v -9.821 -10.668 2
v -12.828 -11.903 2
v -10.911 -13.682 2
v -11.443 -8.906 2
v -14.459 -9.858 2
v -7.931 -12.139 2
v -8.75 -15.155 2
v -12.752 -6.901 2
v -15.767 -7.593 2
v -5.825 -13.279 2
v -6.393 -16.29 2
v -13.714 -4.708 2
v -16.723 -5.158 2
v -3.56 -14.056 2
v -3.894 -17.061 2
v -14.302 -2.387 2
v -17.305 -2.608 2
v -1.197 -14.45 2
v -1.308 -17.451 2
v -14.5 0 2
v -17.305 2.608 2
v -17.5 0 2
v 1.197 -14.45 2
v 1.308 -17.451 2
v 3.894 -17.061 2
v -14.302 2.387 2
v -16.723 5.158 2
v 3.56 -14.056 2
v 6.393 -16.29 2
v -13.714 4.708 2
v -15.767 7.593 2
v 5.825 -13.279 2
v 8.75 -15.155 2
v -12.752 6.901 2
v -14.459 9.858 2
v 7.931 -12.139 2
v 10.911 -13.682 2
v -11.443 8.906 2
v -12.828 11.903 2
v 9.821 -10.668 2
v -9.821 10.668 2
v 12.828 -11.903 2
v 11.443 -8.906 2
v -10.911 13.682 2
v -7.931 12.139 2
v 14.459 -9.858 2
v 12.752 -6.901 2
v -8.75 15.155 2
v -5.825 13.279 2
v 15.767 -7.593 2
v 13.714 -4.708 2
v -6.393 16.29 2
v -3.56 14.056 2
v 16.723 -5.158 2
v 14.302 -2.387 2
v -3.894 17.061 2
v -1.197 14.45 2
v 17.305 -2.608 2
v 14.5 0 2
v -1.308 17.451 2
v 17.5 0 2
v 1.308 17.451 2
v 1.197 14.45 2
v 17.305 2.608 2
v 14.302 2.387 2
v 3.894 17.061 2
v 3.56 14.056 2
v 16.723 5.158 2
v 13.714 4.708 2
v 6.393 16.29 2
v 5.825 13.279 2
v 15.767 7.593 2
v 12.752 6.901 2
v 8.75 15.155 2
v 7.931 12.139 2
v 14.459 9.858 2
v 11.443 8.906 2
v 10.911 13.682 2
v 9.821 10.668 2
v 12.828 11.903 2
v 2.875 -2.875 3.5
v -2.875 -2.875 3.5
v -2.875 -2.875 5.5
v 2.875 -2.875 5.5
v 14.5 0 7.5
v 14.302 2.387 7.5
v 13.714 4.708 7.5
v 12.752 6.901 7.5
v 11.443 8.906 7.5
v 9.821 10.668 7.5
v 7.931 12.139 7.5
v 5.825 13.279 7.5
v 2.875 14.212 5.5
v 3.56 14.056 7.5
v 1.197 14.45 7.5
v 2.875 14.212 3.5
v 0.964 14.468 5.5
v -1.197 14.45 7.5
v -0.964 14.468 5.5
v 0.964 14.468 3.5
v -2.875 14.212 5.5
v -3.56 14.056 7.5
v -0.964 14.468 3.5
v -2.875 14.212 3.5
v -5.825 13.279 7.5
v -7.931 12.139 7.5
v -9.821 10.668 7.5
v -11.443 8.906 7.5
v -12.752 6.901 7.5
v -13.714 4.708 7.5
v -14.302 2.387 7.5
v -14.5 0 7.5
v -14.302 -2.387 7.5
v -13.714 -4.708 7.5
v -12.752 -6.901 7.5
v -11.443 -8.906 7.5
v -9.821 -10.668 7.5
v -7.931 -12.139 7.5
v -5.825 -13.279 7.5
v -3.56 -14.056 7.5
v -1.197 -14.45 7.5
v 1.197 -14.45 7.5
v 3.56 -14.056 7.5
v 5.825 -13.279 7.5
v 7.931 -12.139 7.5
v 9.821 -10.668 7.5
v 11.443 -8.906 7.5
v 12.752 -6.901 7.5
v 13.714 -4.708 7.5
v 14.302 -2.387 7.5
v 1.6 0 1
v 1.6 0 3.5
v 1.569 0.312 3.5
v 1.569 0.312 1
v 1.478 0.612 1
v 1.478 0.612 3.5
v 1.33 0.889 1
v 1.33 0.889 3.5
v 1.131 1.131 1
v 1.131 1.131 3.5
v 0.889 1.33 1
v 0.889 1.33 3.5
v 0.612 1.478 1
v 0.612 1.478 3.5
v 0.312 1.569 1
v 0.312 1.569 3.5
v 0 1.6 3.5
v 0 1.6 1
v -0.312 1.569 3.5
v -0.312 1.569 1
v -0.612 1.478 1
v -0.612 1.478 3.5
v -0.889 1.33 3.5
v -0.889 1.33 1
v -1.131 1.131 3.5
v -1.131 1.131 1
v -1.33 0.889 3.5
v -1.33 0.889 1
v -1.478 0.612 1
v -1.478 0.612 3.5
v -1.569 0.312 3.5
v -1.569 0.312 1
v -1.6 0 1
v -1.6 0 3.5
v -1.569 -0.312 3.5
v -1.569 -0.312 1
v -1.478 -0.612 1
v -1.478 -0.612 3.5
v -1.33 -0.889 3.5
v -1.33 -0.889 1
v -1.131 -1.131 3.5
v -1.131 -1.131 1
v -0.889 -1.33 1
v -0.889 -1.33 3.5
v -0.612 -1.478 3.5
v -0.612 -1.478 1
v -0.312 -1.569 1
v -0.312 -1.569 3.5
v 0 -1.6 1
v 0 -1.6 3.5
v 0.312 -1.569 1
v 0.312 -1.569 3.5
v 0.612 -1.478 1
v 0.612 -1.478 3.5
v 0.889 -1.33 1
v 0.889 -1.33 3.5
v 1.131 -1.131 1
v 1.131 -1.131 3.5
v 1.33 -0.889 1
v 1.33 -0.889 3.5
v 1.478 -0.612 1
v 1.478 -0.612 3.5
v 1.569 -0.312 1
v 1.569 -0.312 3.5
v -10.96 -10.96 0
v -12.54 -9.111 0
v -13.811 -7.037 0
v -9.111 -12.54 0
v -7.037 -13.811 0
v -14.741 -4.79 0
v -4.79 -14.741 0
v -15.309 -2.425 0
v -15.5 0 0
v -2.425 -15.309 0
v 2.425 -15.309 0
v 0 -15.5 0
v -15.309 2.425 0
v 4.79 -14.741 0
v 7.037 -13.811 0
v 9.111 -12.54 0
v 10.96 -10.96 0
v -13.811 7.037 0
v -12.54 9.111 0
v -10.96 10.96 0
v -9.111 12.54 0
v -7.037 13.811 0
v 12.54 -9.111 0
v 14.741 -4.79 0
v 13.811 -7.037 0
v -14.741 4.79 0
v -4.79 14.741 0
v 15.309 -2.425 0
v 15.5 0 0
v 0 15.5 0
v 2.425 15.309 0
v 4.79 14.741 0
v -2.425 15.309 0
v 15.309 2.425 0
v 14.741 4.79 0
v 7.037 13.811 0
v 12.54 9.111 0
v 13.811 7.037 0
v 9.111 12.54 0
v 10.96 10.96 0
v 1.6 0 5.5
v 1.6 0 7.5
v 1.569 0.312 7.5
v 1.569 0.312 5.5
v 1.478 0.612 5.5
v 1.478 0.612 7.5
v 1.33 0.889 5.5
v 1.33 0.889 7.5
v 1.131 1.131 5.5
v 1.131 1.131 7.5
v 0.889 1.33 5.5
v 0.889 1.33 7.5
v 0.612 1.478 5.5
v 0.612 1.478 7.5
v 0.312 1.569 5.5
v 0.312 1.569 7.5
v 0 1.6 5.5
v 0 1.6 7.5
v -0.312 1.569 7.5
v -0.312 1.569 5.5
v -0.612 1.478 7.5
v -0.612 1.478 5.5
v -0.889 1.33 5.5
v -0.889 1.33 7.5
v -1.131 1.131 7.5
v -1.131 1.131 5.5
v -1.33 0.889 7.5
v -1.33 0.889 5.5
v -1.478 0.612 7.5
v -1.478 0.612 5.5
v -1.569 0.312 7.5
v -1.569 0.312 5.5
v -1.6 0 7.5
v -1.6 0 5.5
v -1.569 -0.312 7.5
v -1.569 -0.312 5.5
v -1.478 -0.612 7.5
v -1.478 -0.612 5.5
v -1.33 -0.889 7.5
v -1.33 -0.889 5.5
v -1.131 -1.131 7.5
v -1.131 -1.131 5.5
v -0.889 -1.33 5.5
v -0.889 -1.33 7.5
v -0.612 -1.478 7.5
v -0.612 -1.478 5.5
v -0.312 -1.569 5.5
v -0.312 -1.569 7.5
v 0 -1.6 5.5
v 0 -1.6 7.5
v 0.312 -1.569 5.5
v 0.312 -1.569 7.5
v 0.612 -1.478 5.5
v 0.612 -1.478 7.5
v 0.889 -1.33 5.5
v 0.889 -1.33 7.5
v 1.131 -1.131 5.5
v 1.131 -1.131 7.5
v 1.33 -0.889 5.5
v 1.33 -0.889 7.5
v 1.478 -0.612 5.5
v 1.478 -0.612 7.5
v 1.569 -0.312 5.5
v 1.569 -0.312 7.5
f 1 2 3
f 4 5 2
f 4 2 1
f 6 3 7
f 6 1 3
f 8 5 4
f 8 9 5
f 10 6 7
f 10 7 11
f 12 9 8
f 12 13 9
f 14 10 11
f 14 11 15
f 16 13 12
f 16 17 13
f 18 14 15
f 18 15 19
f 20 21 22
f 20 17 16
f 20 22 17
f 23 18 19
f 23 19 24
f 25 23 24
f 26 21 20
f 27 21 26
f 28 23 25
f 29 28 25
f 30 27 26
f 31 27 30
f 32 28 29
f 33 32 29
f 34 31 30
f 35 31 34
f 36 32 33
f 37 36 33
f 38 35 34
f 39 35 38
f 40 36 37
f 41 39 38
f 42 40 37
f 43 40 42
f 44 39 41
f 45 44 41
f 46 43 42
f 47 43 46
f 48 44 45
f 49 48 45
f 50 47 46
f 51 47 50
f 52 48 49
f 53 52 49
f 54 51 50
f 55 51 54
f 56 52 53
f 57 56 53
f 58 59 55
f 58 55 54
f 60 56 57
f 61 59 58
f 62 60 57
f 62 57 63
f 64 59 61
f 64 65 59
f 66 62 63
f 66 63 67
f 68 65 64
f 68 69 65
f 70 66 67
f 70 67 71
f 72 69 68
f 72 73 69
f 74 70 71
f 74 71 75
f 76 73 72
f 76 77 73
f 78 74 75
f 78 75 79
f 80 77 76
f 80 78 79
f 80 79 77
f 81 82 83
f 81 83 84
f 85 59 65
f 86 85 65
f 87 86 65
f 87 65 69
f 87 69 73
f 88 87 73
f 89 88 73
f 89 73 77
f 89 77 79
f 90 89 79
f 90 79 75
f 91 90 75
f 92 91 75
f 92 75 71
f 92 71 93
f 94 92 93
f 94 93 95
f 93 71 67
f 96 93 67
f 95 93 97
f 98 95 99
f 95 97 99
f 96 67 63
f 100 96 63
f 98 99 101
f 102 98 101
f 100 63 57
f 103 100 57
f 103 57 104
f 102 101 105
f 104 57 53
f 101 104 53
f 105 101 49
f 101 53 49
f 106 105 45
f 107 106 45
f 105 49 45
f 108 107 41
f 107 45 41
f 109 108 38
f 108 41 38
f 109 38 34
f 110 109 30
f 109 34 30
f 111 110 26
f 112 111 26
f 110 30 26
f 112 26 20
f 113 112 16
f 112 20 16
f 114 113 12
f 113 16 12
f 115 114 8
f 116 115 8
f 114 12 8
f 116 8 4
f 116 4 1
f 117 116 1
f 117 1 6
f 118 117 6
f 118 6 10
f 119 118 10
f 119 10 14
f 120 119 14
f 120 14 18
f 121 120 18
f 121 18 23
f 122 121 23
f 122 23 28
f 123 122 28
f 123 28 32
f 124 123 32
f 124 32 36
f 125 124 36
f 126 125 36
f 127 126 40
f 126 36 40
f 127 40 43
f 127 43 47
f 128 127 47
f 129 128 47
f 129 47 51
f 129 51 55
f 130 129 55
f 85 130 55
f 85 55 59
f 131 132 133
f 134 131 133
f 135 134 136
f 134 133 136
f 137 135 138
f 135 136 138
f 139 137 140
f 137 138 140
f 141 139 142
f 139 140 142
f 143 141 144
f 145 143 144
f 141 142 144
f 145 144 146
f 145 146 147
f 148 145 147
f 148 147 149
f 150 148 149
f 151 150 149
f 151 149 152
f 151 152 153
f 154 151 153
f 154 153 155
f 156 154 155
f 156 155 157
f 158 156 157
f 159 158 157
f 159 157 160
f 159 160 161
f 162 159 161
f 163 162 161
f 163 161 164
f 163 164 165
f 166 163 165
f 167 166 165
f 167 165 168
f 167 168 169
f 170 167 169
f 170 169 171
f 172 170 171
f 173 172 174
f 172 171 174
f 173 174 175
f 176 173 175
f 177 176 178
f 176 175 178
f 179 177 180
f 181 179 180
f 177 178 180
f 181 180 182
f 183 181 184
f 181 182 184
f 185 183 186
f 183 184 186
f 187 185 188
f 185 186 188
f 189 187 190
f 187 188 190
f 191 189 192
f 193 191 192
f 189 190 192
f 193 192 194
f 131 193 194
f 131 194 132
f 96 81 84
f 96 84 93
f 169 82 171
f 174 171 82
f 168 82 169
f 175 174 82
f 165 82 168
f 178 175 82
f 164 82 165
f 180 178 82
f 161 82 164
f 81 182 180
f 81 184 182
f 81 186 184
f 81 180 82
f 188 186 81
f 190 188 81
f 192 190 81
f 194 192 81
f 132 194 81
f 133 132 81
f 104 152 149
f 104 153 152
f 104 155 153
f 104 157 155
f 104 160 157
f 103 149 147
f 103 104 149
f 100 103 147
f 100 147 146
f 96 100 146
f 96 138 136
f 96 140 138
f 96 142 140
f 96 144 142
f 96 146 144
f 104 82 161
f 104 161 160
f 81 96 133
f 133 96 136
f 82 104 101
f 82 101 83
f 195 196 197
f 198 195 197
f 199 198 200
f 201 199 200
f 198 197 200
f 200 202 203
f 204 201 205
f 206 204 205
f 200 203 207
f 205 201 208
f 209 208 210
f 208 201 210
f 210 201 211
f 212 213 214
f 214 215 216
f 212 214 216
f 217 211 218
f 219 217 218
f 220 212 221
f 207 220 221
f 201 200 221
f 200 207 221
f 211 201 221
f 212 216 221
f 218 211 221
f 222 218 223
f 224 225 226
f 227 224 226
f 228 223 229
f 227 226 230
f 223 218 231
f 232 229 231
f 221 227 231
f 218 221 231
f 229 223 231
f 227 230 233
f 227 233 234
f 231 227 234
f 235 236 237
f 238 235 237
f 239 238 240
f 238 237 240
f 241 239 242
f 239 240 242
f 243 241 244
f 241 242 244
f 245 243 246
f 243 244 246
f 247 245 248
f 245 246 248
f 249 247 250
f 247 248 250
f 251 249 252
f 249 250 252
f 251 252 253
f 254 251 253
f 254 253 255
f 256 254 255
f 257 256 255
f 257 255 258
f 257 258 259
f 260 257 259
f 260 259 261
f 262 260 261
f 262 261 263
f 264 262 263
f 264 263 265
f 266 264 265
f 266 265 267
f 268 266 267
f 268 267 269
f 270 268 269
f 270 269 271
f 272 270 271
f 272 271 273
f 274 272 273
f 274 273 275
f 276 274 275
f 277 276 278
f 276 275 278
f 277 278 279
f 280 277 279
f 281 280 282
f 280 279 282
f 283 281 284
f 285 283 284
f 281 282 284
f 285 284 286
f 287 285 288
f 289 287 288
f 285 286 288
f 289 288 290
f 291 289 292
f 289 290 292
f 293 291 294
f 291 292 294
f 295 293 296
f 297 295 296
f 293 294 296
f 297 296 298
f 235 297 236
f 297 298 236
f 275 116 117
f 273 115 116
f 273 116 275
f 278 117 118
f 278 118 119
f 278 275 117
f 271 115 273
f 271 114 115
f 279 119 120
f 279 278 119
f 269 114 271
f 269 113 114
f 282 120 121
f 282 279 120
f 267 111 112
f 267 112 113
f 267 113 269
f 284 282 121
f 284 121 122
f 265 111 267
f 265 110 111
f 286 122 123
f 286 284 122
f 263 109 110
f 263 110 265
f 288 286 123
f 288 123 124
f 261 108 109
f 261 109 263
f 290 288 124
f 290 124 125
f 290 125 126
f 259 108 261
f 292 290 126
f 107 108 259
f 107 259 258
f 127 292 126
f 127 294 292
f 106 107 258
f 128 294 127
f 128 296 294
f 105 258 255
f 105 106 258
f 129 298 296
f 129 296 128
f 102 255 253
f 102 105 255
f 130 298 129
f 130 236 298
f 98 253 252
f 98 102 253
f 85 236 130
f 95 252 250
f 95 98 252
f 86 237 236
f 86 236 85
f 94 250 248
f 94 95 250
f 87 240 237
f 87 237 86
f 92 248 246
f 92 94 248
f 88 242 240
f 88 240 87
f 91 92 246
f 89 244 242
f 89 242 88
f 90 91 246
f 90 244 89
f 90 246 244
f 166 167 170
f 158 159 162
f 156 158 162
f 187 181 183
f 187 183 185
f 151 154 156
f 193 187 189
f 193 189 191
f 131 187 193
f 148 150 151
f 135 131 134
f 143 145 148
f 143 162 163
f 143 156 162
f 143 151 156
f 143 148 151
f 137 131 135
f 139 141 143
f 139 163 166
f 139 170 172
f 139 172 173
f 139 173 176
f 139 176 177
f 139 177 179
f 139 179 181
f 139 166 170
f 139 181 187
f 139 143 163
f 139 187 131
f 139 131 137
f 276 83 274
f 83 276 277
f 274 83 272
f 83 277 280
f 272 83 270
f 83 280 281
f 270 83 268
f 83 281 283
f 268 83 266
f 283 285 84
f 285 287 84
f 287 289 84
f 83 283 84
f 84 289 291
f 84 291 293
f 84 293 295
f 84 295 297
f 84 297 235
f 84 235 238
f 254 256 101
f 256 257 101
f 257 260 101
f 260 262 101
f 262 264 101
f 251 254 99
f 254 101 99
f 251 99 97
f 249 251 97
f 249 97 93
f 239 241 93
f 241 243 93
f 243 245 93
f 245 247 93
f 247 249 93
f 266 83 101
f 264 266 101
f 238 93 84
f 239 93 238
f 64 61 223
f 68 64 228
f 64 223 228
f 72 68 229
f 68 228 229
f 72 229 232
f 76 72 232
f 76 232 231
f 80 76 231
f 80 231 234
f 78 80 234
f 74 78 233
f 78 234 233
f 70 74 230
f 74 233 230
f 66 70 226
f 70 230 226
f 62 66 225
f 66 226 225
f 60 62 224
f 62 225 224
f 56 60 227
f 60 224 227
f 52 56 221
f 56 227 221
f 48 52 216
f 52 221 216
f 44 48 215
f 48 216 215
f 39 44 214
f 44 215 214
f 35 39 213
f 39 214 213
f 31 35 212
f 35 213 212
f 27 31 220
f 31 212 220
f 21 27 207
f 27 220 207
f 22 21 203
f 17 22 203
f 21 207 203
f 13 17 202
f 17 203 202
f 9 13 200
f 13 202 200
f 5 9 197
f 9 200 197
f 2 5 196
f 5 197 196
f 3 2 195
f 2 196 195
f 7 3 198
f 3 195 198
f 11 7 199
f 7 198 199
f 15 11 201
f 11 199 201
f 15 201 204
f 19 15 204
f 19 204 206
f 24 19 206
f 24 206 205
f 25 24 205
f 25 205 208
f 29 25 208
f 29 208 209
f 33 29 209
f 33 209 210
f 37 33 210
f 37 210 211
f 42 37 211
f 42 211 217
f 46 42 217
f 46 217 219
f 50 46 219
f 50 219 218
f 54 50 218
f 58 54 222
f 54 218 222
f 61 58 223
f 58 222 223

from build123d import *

# Parameters (mm, degrees)
F0_R     = 17.5
F1_DEPTH = 2
F2_R     = 14.5
F3_DEPTH = 5.5
F4_W     = 5.75
F4_H     = 5.75
F5_DEPTH = 2
F8_R     = 1.6
F9_DEPTH = 6.5
F10_SIZE = 1.99999


# Not quite as in the source:
# - a fillet or chamfer is up to 0.001 mm smaller than in the source, because OpenCascade refuses the exact size


with BuildPart() as f1:
    # F0 (on Top) → F1 (new body)
    with BuildSketch(Plane.XY):
        Circle(F0_R)
    extrude(amount=F1_DEPTH)

    # F2 (on face) → F3 (join)
    with BuildSketch(Plane.XY.offset(2)):
        Circle(F2_R)
    extrude(amount=F3_DEPTH)


with BuildPart() as f5:
    # F4 (on face) → F5 (new body)
    with BuildSketch(Plane.XY.offset(7.5)):
        with BuildLine():
            Line((-2.875, 2.875), (2.875, 2.875))
            Line((2.875, 2.875), (2.875, 14.2121207073))
            ThreePointArc((2.875, 14.2121207073), (0, 14.5), (-2.875, 14.2121207073))
            Line((-2.875, 14.2121207073), (-2.875, 2.875))
        make_face()
        Rectangle(F4_W, F4_H)
    extrude(amount=F5_DEPTH)


with BuildPart() as f5_1:
    # F6: moved
    add(f5.part.moved(Location((0, 0, -4))))


with BuildPart() as f1_1:
    add(f1.part)

    # F7: cut F5
    add(f5_1.part, mode=Mode.SUBTRACT)

    # F8 (on face) → F9 (cut)
    with BuildSketch(Plane.XY.offset(7.5)):
        Circle(F8_R)
    extrude(amount=-F9_DEPTH, mode=Mode.SUBTRACT)

    # F10 (size 2 in the source; OpenCascade refuses exactly that, so slightly less here)
    f10_edges = [f1_1.edges().sort_by_distance(p)[0] for p in [
        (-17.5, 0, 0),
    ]]
    chamfer(f10_edges, length=F10_SIZE)


solid = f1_1.part
